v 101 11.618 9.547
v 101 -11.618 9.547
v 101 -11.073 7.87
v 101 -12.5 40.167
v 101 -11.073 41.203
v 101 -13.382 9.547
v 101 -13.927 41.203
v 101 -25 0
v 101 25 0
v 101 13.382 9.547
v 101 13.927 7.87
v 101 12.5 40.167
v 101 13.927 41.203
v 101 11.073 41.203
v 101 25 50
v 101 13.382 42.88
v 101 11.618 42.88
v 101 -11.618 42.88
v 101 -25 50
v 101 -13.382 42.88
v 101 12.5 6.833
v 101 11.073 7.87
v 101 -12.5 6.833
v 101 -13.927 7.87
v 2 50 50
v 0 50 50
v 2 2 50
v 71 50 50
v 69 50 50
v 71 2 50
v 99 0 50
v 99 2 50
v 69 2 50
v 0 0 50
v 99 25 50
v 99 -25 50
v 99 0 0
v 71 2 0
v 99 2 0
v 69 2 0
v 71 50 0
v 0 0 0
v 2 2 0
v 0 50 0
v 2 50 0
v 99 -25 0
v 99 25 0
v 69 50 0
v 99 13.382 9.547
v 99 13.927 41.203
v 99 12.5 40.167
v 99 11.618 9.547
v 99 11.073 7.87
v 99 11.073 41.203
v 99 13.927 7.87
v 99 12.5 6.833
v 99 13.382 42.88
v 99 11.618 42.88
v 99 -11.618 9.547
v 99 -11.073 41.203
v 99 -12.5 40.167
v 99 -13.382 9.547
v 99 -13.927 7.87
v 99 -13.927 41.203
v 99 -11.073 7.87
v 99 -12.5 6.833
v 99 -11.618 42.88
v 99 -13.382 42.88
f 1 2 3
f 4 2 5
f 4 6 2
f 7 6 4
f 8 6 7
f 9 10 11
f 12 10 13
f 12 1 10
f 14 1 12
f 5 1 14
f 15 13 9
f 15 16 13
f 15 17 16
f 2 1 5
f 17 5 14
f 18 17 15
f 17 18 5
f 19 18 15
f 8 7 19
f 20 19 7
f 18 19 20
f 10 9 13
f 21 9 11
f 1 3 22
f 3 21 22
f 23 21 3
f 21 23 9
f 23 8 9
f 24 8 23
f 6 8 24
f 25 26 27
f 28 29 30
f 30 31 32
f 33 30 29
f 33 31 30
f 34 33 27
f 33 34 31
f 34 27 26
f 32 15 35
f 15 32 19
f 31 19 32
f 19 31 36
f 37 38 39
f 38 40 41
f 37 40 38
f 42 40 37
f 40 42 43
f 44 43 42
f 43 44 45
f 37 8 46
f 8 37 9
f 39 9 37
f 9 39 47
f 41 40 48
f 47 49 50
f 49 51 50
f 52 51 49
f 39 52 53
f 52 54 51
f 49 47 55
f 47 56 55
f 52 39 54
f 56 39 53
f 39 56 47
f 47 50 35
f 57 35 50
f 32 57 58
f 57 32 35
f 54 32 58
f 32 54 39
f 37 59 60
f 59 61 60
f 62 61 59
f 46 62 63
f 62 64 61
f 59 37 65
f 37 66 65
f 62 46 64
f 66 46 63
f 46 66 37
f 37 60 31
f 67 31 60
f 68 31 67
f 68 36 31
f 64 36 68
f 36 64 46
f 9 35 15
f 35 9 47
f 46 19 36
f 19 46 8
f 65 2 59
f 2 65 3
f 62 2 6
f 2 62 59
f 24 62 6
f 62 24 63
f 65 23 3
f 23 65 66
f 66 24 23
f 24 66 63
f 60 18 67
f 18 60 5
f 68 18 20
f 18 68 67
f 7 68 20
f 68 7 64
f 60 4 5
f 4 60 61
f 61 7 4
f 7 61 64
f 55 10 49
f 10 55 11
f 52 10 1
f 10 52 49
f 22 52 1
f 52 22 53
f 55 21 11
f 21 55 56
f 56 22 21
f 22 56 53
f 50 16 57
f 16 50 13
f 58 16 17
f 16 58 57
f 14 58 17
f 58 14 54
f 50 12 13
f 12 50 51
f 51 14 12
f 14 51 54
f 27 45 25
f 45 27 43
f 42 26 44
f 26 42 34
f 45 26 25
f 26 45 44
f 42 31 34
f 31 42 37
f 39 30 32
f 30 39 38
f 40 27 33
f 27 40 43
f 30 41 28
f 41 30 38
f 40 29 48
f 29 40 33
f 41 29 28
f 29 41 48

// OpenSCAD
polster = 69;
length = 50;

cube([2,50,length]);
cube([polster,2,length]);
translate([polster,0,0]) cube([2,50,length]);
translate([polster,0,0]) cube([30,2,length]);
translate([polster + 30,-25,0]) difference() {
 cube([2,50,length]);
 translate([-1,length/4, length/6]) rotate([0, 90, 0]) cylinder(4, 1.5, 1.5);   
 translate([-1,length/4, length - (length/6)]) rotate([0, 90, 0])cylinder(4, 1.5, 1.5);   

 translate([-1, length - length/4, length/6]) rotate([0, 90, 0]) cylinder(4,1.5, 1.5);   
 translate([-1,length - length/4, length - (length/6)]) rotate([0, 90, 0]) cylinder(4, 1.5, 1.5);   
   
}
